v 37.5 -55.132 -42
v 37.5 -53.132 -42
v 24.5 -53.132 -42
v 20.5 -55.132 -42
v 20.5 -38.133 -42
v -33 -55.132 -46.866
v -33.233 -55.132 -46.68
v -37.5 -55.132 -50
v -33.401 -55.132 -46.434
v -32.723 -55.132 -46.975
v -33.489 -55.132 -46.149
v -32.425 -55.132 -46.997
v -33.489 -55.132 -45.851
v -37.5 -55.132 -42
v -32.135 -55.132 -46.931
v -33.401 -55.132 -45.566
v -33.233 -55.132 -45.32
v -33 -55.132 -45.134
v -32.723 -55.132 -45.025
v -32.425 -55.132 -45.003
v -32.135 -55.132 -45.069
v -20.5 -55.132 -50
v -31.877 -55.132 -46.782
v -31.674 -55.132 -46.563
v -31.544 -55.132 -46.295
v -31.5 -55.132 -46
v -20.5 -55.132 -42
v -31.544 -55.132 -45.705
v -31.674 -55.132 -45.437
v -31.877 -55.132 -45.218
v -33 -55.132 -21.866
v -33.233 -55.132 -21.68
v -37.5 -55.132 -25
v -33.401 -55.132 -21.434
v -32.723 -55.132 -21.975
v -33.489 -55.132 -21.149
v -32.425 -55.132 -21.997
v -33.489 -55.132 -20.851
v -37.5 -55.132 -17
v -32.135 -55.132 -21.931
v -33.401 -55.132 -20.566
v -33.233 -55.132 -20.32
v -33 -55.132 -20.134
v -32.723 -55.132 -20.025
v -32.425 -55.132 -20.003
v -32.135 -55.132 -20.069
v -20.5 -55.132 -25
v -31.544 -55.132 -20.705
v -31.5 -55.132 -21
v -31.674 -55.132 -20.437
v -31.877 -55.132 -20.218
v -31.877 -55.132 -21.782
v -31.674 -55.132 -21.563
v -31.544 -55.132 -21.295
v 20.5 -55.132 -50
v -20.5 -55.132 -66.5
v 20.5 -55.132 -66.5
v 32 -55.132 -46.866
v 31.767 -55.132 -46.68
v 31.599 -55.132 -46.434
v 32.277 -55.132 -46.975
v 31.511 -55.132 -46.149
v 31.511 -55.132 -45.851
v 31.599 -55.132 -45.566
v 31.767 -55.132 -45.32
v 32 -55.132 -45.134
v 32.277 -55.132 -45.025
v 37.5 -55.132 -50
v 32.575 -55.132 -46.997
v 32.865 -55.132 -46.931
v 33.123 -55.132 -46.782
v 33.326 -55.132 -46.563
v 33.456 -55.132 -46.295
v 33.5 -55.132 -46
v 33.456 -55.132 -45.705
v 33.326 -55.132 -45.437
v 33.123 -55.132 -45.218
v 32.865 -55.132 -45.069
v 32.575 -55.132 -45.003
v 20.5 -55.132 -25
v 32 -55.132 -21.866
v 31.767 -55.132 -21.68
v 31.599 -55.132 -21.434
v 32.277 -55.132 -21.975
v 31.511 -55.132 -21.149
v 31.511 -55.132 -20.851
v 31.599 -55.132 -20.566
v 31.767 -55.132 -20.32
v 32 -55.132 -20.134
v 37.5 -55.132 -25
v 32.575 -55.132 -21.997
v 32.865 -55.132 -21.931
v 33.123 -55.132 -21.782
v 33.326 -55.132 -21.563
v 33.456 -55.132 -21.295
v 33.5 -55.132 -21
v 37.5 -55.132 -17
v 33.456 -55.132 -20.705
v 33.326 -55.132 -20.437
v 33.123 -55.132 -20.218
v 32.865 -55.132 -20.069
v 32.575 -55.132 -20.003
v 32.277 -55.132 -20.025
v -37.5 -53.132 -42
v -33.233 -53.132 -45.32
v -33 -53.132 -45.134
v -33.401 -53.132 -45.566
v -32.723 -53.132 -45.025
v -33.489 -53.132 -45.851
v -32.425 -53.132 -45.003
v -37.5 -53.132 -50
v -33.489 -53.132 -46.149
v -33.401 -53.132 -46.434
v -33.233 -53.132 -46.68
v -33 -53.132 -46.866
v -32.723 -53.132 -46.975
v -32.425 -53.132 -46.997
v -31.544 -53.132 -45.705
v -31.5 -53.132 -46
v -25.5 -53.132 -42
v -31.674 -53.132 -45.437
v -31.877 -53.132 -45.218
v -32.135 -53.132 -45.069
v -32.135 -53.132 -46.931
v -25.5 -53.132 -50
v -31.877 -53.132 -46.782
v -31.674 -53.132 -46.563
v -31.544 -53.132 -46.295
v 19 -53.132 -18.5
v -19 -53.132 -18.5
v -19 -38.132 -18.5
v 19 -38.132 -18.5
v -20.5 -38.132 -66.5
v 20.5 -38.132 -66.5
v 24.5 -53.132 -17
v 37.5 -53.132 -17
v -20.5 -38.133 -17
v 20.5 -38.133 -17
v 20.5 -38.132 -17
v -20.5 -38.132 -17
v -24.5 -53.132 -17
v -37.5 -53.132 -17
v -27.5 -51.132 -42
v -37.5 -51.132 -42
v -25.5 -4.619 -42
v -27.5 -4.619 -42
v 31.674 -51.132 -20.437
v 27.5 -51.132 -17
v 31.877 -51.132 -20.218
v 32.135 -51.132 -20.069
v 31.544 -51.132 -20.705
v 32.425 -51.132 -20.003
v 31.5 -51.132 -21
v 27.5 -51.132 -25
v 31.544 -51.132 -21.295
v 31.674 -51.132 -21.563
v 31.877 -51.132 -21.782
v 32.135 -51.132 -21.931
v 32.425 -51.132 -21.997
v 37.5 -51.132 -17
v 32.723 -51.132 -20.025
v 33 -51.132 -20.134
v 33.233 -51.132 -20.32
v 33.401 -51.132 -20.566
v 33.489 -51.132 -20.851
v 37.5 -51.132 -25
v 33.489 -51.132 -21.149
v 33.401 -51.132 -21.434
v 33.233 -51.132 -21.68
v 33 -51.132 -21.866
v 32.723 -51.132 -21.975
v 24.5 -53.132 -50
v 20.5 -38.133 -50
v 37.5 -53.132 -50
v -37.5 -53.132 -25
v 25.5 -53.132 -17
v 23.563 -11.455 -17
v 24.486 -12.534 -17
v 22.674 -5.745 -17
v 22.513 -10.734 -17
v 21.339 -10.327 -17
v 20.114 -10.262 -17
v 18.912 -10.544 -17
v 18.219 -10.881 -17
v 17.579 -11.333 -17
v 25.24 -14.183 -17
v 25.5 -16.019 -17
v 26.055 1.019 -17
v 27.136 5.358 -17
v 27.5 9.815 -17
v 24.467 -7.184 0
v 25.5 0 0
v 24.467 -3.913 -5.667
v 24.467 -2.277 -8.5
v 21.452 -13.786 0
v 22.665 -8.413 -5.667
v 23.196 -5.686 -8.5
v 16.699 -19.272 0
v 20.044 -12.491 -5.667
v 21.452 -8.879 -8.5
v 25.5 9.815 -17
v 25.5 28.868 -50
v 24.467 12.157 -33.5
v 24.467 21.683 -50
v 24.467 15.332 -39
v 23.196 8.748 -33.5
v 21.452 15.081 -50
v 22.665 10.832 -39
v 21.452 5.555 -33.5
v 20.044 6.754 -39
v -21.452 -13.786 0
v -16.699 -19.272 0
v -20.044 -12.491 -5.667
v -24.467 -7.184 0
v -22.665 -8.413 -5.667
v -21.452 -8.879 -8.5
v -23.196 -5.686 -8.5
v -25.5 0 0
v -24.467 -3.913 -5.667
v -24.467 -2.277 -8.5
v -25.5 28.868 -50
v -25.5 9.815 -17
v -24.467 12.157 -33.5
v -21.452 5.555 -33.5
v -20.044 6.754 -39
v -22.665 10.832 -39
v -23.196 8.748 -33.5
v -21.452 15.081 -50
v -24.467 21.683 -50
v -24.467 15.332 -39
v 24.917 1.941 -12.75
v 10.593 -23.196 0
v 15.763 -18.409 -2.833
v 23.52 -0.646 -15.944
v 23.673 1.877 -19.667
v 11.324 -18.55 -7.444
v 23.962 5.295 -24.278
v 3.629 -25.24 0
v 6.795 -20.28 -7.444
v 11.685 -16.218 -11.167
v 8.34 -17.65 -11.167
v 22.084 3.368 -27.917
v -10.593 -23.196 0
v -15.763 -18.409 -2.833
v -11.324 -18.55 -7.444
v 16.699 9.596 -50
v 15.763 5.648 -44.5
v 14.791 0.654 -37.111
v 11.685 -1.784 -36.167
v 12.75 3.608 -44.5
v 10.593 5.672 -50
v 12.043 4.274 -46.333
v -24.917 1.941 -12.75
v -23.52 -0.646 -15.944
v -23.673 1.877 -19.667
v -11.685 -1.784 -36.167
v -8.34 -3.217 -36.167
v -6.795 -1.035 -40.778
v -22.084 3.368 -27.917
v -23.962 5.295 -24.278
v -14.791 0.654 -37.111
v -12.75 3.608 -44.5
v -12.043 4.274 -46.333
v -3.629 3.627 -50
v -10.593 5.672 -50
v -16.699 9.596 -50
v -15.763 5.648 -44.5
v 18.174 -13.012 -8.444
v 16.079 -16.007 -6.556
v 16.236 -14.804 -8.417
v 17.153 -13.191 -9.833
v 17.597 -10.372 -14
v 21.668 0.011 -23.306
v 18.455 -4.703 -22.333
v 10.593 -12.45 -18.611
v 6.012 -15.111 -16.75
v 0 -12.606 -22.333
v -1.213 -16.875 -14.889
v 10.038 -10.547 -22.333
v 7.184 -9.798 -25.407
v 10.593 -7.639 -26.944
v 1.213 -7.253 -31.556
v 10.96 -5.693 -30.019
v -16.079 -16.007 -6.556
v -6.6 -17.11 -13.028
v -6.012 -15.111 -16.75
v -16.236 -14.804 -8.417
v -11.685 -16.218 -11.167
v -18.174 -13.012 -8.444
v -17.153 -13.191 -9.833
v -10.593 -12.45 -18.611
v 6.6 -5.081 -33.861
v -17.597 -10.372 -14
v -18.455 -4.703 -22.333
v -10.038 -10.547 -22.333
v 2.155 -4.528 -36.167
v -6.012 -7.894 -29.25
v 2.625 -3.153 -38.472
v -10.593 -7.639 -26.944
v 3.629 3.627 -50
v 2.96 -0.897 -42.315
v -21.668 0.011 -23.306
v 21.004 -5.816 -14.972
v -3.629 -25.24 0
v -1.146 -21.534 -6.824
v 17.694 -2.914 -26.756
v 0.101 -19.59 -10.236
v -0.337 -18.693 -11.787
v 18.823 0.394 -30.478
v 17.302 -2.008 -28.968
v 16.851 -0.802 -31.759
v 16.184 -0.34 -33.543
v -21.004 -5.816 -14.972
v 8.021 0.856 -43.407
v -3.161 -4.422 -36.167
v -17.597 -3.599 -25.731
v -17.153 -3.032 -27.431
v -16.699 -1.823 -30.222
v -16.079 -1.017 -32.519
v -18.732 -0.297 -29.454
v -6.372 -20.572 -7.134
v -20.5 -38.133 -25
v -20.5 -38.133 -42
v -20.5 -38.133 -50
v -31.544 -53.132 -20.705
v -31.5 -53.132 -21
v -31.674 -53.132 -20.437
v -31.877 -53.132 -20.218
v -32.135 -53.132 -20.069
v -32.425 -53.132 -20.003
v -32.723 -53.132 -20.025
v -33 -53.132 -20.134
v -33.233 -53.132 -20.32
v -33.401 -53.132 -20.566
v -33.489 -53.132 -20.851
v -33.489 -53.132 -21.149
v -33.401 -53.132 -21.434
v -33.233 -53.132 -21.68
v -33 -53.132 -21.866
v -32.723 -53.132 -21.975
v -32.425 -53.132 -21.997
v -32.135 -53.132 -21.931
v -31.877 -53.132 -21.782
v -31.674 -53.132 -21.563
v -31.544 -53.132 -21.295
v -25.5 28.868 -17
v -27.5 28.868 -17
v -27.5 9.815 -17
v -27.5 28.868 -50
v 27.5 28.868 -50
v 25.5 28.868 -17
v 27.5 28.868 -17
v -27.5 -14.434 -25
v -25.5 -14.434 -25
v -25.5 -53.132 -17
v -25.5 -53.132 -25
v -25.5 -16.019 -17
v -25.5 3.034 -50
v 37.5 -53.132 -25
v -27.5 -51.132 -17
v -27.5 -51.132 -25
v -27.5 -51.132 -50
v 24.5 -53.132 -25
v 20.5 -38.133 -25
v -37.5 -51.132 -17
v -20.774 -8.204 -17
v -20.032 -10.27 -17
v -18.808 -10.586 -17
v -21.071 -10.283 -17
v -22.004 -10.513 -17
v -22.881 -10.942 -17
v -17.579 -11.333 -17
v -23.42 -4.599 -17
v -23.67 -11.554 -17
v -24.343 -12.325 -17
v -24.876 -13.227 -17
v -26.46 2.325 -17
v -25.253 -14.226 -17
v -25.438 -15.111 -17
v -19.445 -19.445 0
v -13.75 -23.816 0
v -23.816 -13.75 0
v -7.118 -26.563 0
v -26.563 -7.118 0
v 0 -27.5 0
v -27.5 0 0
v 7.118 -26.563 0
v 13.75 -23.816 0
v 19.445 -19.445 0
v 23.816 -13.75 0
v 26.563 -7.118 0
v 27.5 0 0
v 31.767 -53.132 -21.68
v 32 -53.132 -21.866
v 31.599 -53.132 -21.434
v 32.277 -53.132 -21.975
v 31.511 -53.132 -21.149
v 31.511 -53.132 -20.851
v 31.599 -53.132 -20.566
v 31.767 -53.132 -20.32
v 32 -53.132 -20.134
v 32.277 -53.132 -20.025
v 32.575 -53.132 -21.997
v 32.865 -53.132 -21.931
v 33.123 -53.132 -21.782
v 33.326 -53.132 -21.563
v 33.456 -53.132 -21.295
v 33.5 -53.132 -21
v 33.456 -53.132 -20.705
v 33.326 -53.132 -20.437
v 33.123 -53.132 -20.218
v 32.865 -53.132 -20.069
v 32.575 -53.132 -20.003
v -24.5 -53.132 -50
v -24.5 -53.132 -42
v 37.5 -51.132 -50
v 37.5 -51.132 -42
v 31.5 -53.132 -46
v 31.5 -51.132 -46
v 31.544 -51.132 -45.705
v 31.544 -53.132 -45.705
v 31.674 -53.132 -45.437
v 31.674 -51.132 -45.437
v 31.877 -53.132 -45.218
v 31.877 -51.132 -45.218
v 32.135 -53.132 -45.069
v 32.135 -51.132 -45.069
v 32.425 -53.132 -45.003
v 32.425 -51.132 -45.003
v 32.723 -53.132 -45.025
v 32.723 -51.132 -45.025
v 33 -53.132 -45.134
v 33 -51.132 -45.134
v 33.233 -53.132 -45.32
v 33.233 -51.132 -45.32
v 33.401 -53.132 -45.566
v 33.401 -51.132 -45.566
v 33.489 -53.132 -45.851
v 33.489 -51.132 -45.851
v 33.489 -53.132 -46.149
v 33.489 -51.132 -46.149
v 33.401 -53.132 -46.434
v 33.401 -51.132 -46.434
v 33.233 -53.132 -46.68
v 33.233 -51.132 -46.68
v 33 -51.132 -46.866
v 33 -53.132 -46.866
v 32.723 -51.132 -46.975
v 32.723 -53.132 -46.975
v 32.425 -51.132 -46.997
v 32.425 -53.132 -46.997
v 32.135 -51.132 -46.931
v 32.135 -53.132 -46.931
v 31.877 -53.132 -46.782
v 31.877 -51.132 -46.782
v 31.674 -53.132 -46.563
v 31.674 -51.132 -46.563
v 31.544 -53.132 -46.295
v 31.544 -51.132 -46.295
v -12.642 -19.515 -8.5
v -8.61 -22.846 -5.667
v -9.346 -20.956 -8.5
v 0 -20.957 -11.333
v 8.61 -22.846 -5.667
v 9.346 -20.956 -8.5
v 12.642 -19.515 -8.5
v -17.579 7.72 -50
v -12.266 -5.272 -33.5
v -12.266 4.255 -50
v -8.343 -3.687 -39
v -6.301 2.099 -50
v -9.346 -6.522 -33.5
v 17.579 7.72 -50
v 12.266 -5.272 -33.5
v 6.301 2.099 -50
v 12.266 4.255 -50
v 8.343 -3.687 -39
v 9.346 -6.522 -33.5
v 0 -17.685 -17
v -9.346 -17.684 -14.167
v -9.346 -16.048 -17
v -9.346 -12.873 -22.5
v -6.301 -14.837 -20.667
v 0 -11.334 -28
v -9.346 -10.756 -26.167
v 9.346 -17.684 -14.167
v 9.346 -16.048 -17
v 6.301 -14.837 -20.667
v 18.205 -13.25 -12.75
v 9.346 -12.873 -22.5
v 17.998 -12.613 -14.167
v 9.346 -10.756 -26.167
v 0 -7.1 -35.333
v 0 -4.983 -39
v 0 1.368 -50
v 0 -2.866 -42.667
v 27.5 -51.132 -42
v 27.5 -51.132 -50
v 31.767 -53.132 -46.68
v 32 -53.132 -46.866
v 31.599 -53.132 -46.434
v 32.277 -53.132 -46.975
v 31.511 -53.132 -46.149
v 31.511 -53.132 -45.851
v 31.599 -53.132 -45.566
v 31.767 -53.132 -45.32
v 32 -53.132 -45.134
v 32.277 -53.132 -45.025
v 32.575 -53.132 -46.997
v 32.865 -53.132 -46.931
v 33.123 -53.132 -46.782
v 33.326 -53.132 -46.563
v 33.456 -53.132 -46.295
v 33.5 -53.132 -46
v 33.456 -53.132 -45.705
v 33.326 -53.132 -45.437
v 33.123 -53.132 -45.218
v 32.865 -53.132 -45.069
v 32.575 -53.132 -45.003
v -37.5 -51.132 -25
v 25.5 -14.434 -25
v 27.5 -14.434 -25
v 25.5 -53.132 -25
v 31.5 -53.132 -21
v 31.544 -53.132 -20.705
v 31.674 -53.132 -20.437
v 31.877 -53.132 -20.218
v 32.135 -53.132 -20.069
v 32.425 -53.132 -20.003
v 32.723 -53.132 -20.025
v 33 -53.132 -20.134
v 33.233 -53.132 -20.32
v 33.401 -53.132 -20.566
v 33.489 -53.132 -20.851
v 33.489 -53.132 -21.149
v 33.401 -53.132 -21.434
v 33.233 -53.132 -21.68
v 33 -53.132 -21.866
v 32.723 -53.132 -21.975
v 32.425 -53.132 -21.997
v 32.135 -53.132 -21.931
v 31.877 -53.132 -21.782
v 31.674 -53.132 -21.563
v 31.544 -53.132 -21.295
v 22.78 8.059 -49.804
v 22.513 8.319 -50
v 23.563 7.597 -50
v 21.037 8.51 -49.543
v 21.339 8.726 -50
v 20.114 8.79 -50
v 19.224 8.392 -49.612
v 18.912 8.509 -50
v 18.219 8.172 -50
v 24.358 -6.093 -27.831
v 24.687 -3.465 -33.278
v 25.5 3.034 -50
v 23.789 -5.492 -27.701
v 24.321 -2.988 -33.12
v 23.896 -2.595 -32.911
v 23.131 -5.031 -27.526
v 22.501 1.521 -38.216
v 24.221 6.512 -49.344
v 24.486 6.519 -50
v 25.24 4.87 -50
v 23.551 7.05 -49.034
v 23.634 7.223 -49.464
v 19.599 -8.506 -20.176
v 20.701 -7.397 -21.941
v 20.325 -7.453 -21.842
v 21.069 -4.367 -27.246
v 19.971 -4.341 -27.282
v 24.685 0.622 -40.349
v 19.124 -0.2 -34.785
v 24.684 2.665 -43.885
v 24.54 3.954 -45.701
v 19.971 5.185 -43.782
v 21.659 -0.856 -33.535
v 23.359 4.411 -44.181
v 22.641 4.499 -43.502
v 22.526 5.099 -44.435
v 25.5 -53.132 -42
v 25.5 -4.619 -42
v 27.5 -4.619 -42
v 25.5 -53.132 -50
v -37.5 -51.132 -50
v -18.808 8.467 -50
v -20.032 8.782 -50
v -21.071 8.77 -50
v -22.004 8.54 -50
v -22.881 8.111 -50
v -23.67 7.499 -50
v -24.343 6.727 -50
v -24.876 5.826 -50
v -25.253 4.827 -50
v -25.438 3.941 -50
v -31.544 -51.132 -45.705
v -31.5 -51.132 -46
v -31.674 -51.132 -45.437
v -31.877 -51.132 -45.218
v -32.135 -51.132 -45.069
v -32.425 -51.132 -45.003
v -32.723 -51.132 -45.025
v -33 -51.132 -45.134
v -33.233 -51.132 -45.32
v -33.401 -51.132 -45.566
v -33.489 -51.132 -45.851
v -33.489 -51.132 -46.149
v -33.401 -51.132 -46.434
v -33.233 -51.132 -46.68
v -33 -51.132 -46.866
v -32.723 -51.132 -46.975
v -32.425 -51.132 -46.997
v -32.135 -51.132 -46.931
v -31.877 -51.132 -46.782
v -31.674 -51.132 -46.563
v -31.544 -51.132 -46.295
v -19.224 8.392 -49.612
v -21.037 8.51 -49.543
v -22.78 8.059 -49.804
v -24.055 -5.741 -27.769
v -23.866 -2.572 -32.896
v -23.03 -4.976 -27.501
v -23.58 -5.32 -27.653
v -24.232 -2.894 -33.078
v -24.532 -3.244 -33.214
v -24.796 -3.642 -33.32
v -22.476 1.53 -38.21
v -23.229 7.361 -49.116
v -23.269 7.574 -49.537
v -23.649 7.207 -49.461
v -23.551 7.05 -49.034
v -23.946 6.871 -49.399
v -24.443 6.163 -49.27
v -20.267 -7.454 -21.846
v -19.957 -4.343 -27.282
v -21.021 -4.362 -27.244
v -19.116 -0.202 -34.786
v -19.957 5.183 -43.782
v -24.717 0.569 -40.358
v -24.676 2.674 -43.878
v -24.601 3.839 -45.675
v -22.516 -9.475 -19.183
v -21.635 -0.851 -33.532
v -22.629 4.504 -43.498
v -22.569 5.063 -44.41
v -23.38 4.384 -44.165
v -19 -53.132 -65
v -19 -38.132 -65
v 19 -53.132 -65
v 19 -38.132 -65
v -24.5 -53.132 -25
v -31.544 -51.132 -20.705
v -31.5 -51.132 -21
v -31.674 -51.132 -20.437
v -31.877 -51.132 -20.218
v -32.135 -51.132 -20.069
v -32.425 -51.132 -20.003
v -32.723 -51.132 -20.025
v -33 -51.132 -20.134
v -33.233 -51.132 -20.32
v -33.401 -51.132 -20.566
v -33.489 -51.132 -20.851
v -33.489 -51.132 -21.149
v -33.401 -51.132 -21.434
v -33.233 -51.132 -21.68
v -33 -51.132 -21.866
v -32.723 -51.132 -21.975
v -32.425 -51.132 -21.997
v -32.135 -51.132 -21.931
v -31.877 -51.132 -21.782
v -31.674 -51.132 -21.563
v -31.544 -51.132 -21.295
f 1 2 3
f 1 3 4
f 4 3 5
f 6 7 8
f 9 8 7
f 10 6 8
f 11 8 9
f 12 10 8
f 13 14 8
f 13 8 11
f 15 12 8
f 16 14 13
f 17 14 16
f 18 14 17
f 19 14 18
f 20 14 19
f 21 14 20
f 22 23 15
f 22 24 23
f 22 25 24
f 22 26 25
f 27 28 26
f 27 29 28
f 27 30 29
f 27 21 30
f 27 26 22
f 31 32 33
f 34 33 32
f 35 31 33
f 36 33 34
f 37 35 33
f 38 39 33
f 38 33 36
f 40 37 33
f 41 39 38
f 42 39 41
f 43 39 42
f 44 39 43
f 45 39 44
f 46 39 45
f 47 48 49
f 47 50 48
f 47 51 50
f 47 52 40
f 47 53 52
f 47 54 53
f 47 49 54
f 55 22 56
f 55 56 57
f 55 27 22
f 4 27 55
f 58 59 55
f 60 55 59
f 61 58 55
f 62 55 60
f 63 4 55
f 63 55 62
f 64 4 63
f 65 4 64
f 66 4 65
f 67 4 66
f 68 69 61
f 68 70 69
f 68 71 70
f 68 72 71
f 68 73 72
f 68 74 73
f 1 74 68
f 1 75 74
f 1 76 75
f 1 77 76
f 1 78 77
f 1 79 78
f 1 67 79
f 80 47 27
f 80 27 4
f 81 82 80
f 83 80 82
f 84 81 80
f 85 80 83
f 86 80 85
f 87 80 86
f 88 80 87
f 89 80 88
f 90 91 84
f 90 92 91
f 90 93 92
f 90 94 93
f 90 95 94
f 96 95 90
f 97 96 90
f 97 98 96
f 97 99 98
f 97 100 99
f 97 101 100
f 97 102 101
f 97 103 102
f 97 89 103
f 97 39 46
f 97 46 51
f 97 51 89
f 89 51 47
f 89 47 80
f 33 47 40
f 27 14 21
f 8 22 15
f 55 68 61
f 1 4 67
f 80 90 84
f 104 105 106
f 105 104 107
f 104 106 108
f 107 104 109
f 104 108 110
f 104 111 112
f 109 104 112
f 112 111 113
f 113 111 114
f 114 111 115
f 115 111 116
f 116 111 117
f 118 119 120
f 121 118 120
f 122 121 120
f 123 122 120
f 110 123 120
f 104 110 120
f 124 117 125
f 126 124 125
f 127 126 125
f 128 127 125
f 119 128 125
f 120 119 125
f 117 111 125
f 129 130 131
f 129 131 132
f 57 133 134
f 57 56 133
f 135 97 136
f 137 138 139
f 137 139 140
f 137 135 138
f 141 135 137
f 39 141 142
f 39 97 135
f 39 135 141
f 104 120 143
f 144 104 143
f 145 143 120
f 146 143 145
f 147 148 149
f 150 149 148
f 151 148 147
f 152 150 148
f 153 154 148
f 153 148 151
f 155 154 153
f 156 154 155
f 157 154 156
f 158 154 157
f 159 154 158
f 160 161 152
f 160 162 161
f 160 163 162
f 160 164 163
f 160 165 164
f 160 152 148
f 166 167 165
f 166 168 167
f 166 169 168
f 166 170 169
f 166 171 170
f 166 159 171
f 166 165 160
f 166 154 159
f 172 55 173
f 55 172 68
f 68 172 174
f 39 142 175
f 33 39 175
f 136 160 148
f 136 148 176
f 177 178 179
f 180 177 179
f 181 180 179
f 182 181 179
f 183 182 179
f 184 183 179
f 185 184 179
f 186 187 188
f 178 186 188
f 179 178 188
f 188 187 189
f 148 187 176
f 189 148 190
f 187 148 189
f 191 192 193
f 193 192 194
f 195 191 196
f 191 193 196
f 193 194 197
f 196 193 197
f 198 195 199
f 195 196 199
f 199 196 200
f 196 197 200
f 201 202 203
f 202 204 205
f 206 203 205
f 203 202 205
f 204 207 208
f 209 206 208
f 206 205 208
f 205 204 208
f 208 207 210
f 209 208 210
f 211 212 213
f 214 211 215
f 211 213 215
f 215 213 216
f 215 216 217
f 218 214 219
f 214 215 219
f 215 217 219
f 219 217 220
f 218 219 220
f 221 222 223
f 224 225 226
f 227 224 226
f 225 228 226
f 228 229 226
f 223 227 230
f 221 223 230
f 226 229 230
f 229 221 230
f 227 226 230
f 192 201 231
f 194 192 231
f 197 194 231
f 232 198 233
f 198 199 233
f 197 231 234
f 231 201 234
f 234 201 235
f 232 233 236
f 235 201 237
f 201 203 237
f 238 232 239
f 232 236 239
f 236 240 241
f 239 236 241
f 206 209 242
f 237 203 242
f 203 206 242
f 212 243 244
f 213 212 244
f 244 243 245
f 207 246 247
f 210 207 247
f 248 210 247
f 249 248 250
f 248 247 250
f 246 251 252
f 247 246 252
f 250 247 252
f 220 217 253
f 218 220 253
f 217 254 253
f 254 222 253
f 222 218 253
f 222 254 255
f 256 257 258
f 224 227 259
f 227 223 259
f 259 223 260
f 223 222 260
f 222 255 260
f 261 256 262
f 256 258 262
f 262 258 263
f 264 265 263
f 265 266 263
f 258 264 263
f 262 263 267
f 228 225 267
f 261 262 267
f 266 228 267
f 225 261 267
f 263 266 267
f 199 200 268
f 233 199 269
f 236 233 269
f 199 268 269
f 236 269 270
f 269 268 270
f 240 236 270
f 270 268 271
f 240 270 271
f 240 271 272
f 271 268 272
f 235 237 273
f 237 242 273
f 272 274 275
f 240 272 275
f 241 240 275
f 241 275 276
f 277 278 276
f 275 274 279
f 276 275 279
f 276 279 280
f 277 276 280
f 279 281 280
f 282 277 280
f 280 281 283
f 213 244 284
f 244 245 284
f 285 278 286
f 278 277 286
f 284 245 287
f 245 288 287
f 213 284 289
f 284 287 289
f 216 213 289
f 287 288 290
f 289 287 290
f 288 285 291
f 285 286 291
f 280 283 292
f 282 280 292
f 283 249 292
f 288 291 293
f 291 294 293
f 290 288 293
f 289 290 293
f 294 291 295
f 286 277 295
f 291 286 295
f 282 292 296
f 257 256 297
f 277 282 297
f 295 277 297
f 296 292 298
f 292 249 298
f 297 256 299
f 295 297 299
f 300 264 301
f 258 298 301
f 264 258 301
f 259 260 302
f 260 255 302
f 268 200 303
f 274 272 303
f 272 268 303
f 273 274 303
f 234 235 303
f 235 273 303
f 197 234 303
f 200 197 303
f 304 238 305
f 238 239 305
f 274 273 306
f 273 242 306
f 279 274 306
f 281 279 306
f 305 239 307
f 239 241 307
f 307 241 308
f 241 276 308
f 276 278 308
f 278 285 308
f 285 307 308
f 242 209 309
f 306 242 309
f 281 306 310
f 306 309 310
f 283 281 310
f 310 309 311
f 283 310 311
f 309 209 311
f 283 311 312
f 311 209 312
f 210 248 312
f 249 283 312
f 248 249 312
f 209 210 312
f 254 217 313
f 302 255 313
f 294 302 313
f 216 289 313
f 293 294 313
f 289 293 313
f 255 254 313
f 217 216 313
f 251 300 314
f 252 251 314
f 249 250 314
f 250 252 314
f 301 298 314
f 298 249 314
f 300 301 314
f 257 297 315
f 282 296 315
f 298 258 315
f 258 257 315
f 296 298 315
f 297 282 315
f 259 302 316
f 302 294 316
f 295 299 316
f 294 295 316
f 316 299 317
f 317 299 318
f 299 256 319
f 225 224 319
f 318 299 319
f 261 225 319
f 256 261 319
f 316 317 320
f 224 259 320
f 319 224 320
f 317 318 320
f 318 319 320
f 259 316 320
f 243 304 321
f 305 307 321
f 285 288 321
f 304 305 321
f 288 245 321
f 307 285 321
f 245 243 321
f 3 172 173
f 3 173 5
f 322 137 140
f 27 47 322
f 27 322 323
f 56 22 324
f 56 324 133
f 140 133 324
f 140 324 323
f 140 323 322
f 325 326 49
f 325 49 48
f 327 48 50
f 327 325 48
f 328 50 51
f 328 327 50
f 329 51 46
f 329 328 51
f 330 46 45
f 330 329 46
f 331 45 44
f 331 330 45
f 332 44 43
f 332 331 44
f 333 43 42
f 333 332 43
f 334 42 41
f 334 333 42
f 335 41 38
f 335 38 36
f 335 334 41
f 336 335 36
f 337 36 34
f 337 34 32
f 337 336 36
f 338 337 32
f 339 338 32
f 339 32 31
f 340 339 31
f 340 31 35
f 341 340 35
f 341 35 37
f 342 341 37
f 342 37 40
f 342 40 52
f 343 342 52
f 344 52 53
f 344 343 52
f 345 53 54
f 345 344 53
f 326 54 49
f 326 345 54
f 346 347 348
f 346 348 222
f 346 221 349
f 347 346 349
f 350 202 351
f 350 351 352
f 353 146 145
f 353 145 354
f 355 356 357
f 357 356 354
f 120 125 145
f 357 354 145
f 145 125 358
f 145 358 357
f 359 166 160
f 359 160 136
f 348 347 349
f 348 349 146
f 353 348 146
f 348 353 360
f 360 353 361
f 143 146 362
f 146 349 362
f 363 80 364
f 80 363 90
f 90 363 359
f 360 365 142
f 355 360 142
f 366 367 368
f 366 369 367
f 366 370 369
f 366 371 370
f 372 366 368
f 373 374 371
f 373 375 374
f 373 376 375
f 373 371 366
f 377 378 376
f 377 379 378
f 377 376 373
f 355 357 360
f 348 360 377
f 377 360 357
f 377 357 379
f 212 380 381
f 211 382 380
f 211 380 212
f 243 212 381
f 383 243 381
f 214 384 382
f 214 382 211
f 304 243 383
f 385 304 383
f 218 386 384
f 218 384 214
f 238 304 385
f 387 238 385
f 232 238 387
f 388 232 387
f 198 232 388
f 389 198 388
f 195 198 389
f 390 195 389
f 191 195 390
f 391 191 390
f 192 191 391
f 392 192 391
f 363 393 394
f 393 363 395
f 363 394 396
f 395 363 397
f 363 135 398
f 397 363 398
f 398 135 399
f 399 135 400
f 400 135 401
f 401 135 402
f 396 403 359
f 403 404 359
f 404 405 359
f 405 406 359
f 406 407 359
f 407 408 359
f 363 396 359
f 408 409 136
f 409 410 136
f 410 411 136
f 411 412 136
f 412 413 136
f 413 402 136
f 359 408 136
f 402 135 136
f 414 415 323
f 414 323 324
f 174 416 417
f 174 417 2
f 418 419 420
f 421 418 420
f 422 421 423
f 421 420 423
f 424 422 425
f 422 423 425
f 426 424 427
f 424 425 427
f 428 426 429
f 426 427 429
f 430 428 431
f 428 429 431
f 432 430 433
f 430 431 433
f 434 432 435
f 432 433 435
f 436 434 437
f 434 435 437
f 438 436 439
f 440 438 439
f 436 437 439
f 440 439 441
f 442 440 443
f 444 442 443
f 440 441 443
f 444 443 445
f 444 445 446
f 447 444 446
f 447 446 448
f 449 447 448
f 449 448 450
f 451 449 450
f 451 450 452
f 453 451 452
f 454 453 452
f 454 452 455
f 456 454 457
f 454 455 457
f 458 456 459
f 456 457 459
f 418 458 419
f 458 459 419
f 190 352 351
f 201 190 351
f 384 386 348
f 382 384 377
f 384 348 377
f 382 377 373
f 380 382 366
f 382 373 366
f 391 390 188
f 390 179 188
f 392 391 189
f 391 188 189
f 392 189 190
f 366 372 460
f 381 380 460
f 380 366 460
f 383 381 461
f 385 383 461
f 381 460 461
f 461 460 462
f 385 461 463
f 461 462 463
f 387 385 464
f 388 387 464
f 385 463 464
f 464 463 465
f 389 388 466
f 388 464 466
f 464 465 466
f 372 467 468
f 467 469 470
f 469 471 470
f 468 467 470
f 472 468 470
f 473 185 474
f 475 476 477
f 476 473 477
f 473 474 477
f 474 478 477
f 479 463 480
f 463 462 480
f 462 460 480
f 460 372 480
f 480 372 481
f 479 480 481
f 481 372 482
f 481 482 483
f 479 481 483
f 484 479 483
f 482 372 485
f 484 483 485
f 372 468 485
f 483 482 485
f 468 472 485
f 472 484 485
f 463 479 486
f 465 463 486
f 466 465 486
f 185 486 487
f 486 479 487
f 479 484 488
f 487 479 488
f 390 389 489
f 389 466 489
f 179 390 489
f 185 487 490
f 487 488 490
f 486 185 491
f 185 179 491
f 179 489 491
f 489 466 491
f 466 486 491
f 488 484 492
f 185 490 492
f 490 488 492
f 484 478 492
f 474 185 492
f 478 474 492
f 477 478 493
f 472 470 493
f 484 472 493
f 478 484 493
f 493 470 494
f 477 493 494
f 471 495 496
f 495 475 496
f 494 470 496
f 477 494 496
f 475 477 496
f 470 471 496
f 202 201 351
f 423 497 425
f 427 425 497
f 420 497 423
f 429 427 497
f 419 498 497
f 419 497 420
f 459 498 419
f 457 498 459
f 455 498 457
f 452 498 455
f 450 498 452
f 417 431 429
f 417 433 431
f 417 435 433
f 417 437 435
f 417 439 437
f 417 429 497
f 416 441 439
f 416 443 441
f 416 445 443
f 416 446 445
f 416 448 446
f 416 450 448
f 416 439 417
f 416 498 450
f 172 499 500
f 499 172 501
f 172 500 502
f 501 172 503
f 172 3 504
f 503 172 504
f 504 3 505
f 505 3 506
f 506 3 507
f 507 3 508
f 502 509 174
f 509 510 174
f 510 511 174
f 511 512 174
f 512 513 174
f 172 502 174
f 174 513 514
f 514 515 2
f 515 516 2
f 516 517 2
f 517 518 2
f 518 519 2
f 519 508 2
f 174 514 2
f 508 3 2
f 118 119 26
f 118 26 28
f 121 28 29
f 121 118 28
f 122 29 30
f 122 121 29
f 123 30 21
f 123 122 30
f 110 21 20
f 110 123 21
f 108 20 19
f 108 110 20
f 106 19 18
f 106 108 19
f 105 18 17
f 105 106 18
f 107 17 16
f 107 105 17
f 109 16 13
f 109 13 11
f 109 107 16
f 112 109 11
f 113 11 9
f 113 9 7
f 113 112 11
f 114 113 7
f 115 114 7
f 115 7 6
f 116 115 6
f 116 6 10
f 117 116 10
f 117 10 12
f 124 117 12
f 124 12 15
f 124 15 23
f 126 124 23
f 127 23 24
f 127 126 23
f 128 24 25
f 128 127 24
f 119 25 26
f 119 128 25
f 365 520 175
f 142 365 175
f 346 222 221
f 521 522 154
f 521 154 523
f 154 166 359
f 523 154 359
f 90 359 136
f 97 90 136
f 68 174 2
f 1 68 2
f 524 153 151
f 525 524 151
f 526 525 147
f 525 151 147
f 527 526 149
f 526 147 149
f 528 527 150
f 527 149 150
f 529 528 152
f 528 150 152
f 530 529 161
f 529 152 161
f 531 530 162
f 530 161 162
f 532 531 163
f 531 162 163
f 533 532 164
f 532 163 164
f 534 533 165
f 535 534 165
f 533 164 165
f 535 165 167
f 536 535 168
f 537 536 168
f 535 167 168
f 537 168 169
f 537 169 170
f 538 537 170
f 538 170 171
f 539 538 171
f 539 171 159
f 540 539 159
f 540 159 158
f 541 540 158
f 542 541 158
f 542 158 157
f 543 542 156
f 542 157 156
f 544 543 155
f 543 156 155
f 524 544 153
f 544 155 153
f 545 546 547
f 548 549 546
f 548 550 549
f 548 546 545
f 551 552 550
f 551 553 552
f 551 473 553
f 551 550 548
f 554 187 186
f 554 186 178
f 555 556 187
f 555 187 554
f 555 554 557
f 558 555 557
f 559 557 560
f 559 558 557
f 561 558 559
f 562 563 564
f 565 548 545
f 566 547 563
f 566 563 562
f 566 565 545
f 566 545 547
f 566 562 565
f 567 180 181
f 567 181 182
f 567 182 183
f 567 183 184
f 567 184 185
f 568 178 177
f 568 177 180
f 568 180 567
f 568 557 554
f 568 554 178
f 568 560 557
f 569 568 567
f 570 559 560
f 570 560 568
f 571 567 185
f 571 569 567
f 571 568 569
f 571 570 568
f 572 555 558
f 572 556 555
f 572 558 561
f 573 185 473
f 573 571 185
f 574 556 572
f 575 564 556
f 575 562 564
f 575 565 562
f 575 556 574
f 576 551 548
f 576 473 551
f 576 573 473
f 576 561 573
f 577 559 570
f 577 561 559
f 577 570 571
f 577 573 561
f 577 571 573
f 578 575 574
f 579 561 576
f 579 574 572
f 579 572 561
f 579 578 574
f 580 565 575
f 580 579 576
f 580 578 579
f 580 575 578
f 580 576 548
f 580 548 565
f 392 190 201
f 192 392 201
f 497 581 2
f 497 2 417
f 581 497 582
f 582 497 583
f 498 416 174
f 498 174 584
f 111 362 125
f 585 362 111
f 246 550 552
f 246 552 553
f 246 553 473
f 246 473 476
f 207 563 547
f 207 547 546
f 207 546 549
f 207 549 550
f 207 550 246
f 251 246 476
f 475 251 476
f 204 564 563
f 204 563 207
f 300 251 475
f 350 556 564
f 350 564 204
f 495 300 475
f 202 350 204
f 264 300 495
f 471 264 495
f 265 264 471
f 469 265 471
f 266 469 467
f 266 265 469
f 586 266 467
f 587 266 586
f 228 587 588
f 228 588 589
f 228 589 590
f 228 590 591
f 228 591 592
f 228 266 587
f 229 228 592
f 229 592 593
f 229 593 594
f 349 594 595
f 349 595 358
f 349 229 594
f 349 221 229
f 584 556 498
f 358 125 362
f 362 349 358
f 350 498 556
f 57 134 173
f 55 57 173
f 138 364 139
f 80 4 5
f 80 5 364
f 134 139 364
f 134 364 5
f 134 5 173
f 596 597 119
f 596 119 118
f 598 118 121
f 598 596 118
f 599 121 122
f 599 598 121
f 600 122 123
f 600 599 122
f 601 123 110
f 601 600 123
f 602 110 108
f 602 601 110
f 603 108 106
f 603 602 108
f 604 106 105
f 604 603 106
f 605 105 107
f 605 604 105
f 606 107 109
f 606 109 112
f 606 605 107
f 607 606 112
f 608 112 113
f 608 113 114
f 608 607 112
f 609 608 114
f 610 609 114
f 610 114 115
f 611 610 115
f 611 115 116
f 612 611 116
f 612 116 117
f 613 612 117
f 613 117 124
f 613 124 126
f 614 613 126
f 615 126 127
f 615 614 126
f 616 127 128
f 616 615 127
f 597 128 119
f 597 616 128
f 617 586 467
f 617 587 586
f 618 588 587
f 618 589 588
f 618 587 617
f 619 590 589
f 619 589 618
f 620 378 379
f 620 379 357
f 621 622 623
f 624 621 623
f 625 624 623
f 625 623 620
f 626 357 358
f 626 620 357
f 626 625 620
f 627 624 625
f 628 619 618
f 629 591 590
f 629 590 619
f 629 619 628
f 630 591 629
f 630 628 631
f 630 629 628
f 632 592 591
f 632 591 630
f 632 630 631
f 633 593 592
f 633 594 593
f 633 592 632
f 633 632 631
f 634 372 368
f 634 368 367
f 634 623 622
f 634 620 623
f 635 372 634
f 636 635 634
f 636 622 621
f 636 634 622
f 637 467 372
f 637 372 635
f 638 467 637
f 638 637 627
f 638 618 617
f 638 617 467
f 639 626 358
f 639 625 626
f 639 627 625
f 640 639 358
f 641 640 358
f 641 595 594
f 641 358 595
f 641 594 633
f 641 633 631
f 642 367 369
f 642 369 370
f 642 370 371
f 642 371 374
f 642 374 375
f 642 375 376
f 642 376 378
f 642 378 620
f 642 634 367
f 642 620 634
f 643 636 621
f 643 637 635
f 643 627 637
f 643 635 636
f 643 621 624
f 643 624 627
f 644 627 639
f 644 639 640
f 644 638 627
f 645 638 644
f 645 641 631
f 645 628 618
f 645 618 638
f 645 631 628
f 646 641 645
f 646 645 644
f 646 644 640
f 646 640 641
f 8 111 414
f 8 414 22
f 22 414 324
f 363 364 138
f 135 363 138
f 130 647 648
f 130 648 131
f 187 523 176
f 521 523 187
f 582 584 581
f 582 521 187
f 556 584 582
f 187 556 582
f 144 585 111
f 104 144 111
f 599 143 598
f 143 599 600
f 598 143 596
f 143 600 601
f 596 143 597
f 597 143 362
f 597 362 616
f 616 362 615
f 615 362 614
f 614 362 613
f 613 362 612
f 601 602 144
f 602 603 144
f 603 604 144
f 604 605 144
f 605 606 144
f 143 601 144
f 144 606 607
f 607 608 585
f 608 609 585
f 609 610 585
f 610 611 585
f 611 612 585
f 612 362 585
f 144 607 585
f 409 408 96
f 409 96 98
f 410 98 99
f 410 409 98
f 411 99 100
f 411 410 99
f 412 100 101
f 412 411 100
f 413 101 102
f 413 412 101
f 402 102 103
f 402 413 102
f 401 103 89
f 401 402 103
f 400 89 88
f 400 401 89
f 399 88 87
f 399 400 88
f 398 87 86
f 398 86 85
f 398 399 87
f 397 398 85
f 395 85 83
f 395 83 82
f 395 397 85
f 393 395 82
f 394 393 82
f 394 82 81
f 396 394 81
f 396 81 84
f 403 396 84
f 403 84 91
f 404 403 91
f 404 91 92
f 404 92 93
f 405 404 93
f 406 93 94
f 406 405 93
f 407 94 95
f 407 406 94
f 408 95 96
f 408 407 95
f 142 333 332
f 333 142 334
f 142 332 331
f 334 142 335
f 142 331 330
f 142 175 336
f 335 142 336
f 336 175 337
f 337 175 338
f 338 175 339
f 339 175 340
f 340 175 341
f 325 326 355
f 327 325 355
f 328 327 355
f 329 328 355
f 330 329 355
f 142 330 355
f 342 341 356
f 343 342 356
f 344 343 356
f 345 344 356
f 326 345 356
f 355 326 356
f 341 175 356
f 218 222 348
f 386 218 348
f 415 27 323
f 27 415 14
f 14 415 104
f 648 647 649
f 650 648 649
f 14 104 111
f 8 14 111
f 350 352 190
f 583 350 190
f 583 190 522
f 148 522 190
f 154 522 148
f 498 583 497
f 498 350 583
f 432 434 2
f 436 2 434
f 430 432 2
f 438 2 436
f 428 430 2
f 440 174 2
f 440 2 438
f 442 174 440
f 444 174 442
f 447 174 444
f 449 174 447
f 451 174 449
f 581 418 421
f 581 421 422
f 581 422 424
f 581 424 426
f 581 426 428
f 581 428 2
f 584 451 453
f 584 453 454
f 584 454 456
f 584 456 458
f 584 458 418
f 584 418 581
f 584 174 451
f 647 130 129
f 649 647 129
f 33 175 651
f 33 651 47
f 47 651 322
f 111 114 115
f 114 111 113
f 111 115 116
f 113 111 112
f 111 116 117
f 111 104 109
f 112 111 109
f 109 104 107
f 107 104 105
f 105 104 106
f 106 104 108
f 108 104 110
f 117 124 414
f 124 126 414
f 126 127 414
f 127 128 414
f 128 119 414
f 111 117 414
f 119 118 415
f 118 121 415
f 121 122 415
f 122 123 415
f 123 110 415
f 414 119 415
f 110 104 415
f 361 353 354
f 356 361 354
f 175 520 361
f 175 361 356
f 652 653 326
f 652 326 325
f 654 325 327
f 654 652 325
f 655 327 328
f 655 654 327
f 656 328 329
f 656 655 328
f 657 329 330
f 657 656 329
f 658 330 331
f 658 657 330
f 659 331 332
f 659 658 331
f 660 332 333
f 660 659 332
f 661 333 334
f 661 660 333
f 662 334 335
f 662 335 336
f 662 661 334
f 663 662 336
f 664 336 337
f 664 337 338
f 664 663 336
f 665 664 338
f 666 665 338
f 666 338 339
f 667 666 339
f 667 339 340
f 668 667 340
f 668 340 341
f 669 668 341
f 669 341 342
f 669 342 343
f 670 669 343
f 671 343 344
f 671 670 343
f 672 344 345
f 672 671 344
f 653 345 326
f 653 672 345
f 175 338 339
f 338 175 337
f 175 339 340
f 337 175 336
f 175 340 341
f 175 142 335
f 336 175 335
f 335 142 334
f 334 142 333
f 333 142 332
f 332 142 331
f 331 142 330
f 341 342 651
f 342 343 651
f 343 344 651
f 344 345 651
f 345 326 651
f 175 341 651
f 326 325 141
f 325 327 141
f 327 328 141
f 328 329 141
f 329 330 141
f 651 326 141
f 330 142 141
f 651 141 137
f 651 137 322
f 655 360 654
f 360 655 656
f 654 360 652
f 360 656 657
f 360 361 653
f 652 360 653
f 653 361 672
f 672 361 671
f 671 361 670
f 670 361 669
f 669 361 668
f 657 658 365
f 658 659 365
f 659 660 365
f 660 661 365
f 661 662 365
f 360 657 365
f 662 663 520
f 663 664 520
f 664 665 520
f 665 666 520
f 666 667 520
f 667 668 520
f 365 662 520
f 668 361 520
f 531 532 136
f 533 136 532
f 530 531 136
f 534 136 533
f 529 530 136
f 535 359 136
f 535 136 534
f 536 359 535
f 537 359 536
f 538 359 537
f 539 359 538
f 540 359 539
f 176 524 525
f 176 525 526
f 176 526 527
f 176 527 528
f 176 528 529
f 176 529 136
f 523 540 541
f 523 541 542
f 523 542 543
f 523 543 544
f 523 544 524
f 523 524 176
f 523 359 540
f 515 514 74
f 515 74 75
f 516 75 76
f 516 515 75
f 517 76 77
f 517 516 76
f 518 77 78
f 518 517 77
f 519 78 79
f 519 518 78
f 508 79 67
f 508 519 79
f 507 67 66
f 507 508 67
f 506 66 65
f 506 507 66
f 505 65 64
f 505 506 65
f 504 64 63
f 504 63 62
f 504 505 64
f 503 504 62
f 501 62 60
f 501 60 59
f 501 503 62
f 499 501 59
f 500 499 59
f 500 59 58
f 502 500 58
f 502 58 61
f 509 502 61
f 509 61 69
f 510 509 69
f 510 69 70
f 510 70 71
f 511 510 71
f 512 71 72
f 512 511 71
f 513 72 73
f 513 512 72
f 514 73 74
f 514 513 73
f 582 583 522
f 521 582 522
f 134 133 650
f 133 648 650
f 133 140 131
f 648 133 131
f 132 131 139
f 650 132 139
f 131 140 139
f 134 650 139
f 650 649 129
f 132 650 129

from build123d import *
from OCP.BRepFilletAPI import BRepFilletAPI_MakeChamfer

# Parameters (mm, degrees)
BOSS_EXTRUDE1_DEPTH     = 33
CUT_EXTRUDE1_REACH      = 99.714
SKETCH5_R               = 1
CUT_EXTRUDE2_DEPTH      = 2
FILLET1_R               = 5
BOSS_EXTRUDE3_OUTLINE_R = 1
BOSS_EXTRUDE3_DEPTH     = 2
SKETCH6_3_W             = 38
SKETCH6_3_H             = 46.5
BOSS_EXTRUDE4_DEPTH     = 15
CHAMFER1_SIZE           = 15
CHAMFER1_SIZE_2         = 4
CHAMFER2_SIZE           = 15
CHAMFER2_SIZE_2         = 4


with BuildPart() as part:
    # Sweep1: sweep along a path in Sketch2
    with BuildLine(Plane(origin=(0, 0, 0), x_dir=(0, 0, -1), z_dir=(1, 0, 0))) as sweep1_path:
        Line((0, 0), (50, 28.867513459))
    # Sketch1 → Sweep1 (sweep)
    with BuildSketch(Plane.XY):
        with BuildLine():
            Line((-27.5, 0), (-25.5, 0))
            ThreePointArc((-25.5, 0), (0, -25.5), (25.5, 0))
            Line((25.5, 0), (27.5, 0))
            ThreePointArc((27.5, 0), (0, -27.5), (-27.5, 0))
        make_face()
    sweep(path=sweep1_path.line)


with BuildPart() as body_2:
    # Sketch3 → Boss-Extrude1 (new body)
    with BuildSketch(Plane(origin=(0, 0, -50), x_dir=(-1, 0, 0), z_dir=(0, 0, -1))):
        Polygon((-27.5, 28.867513459), (-27.5, -51.132486541), (-37.5, -51.132486541), (-37.5, -53.132486541), (-25.5, -53.132486541), (-25.5, 28.867513459), align=None)
    extrude(amount=-BOSS_EXTRUDE1_DEPTH)

    # Cut-Extrude1: up to this face of the body (flat: up to its plane)
    cut_extrude1_end = Plane(body_2.part.faces().sort_by_distance((25.5, -12.132486541, -33.5))[0])
    # Sketch4 → Cut-Extrude1 (cut, up to the picked face)
    with BuildSketch(Plane(origin=(37.5, 0, 0), x_dir=(0, 0, -1), z_dir=(1, 0, 0)), mode=Mode.PRIVATE) as cut_extrude1_sk1:
        Polygon((25, -53.132486541), (42, -53.132486541), (42, -4.618802154), (25, -14.43375673), align=None)
    cut_extrude1_tool1 = split(extrude(cut_extrude1_sk1.sketch, amount=-CUT_EXTRUDE1_REACH, mode=Mode.PRIVATE), bisect_by=cut_extrude1_end, keep=Keep.BOTH, mode=Mode.PRIVATE)
    add(cut_extrude1_tool1.solids().sort_by(Axis((37.5, -31.237334, -33.818866), (-1, 0, 0)))[0], mode=Mode.SUBTRACT)

    # Sketch5 → Cut-Extrude2 (cut)
    with BuildSketch(Plane(origin=(0, -51.132486541, 0), x_dir=(1, 0, 0), z_dir=(0, 1, 0))):
        with Locations(Location((32.5, 21, 0), (0, 0, 180))):
            Circle(SKETCH5_R)
        with Locations(Location((32.5, 46, 0), (0, 0, 180))):
            Circle(SKETCH5_R)
    extrude(amount=-CUT_EXTRUDE2_DEPTH, mode=Mode.SUBTRACT)


with BuildPart() as body_3:
    # Mirror1: mirrored copy
    add(body_2.part.mirror(Plane(origin=(0, 0, 0), x_dir=(0, 0, 1), z_dir=(1, 0, 0))))


with BuildPart() as part_1:
    add(part.part)

    # Intersect1: read off the stored shape, not the designer's step
    # Intersect1: union body 3, body 2
    add(body_3.part)
    add(body_2.part)

    # Fillet1
    fillet1_edges = [part_1.edges().sort_by_distance(p)[0] for p in [
        (25.5, 9.045603877, -33.5),
        (-25.5, 9.045603877, -33.5),
    ]]
    fillet(fillet1_edges, radius=FILLET1_R)


with BuildPart() as body_2_2:
    # Boss-Extrude3: read off the stored shape, not the designer's step
    # Boss-Extrude3 outline → Boss-Extrude3 (new body)
    with BuildSketch(Plane.XZ.offset(53.132486541)):
        Polygon((37.5, -17), (-37.5, -17), (-37.5, -25), (-20.5, -25), (-20.5, -42), (-37.5, -42), (-37.5, -50), (-20.5, -50), (-20.5, -66.5), (20.5, -66.5), (20.5, -50), (37.5, -50), (37.5, -42), (20.5, -42), (20.5, -25), (37.5, -25), align=None)
        with Locations((-32.5, -46)):
            Circle(BOSS_EXTRUDE3_OUTLINE_R, mode=Mode.SUBTRACT)
        with Locations((32.5, -46)):
            Circle(BOSS_EXTRUDE3_OUTLINE_R, mode=Mode.SUBTRACT)
        with Locations((-32.5, -21)):
            Circle(BOSS_EXTRUDE3_OUTLINE_R, mode=Mode.SUBTRACT)
        with Locations((32.5, -21)):
            Circle(BOSS_EXTRUDE3_OUTLINE_R, mode=Mode.SUBTRACT)
    extrude(amount=BOSS_EXTRUDE3_DEPTH)

    # Sketch6<3> → Boss-Extrude4 (add)
    with BuildSketch(Plane.XZ.offset(53.132486541)):
        Polygon((20.5, -66.5), (20.5, -50), (20.5, -42), (20.5, -25), (20.5, -17), (-20.5, -17), (-20.5, -25), (-20.5, -42), (-20.5, -50), (-20.5, -66.5), align=None)
        with Locations((0, -41.75)):
            Rectangle(SKETCH6_3_W, SKETCH6_3_H, mode=Mode.SUBTRACT)
    extrude(amount=-BOSS_EXTRUDE4_DEPTH)

    # Chamfer1
    chamfer1_edges_1 = [body_2_2.edges().sort_by_distance(p)[0] for p in [
        (-20.5, -53.132486541, -46),
    ]]
    chamfer1_side_1 = [body_2_2.faces().sort_by_distance(p)[0] for p in [
        (-20.5, -53.052486541, -46),
    ]]
    chamfer1_edges_2 = [body_2_2.edges().sort_by_distance(p)[0] for p in [
        (-20.5, -53.132486541, -21),
    ]]
    chamfer1_side_2 = [body_2_2.faces().sort_by_distance(p)[0] for p in [
        (-20.5, -53.052486541, -21),
    ]]
    chamfer1 = BRepFilletAPI_MakeChamfer(body_2_2.part.solid().wrapped)
    for e in chamfer1_edges_1:
        chamfer1.Add(CHAMFER1_SIZE - 0.0001, CHAMFER1_SIZE_2 - 0.0001, e.wrapped, chamfer1_side_1[0].wrapped)
    for e in chamfer1_edges_2:
        chamfer1.Add(CHAMFER1_SIZE - 0.0001, CHAMFER1_SIZE_2 - 0.0001, e.wrapped, chamfer1_side_2[0].wrapped)
    add(Compound.cast(chamfer1.Shape()), mode=Mode.REPLACE)  # a hair under: the kernel refuses the full size

    # Chamfer2
    chamfer2_edges_1 = [body_2_2.edges().sort_by_distance(p)[0] for p in [
        (20.5, -53.132486541, -46),
    ]]
    chamfer2_side_1 = [body_2_2.faces().sort_by_distance(p)[0] for p in [
        (20.5, -53.052486541, -46),
    ]]
    chamfer2_edges_2 = [body_2_2.edges().sort_by_distance(p)[0] for p in [
        (20.5, -53.132486541, -21),
    ]]
    chamfer2_side_2 = [body_2_2.faces().sort_by_distance(p)[0] for p in [
        (20.58, -53.132486541, -21),
    ]]
    chamfer2 = BRepFilletAPI_MakeChamfer(body_2_2.part.solid().wrapped)
    for e in chamfer2_edges_1:
        chamfer2.Add(CHAMFER2_SIZE - 0.0001, CHAMFER2_SIZE_2 - 0.0001, e.wrapped, chamfer2_side_1[0].wrapped)
    for e in chamfer2_edges_2:
        chamfer2.Add(CHAMFER2_SIZE_2 - 0.0001, CHAMFER2_SIZE - 0.0001, e.wrapped, chamfer2_side_2[0].wrapped)
    add(Compound.cast(chamfer2.Shape()), mode=Mode.REPLACE)  # a hair under: the kernel refuses the full size


solid = Compound([part_1.part, body_2_2.part])
